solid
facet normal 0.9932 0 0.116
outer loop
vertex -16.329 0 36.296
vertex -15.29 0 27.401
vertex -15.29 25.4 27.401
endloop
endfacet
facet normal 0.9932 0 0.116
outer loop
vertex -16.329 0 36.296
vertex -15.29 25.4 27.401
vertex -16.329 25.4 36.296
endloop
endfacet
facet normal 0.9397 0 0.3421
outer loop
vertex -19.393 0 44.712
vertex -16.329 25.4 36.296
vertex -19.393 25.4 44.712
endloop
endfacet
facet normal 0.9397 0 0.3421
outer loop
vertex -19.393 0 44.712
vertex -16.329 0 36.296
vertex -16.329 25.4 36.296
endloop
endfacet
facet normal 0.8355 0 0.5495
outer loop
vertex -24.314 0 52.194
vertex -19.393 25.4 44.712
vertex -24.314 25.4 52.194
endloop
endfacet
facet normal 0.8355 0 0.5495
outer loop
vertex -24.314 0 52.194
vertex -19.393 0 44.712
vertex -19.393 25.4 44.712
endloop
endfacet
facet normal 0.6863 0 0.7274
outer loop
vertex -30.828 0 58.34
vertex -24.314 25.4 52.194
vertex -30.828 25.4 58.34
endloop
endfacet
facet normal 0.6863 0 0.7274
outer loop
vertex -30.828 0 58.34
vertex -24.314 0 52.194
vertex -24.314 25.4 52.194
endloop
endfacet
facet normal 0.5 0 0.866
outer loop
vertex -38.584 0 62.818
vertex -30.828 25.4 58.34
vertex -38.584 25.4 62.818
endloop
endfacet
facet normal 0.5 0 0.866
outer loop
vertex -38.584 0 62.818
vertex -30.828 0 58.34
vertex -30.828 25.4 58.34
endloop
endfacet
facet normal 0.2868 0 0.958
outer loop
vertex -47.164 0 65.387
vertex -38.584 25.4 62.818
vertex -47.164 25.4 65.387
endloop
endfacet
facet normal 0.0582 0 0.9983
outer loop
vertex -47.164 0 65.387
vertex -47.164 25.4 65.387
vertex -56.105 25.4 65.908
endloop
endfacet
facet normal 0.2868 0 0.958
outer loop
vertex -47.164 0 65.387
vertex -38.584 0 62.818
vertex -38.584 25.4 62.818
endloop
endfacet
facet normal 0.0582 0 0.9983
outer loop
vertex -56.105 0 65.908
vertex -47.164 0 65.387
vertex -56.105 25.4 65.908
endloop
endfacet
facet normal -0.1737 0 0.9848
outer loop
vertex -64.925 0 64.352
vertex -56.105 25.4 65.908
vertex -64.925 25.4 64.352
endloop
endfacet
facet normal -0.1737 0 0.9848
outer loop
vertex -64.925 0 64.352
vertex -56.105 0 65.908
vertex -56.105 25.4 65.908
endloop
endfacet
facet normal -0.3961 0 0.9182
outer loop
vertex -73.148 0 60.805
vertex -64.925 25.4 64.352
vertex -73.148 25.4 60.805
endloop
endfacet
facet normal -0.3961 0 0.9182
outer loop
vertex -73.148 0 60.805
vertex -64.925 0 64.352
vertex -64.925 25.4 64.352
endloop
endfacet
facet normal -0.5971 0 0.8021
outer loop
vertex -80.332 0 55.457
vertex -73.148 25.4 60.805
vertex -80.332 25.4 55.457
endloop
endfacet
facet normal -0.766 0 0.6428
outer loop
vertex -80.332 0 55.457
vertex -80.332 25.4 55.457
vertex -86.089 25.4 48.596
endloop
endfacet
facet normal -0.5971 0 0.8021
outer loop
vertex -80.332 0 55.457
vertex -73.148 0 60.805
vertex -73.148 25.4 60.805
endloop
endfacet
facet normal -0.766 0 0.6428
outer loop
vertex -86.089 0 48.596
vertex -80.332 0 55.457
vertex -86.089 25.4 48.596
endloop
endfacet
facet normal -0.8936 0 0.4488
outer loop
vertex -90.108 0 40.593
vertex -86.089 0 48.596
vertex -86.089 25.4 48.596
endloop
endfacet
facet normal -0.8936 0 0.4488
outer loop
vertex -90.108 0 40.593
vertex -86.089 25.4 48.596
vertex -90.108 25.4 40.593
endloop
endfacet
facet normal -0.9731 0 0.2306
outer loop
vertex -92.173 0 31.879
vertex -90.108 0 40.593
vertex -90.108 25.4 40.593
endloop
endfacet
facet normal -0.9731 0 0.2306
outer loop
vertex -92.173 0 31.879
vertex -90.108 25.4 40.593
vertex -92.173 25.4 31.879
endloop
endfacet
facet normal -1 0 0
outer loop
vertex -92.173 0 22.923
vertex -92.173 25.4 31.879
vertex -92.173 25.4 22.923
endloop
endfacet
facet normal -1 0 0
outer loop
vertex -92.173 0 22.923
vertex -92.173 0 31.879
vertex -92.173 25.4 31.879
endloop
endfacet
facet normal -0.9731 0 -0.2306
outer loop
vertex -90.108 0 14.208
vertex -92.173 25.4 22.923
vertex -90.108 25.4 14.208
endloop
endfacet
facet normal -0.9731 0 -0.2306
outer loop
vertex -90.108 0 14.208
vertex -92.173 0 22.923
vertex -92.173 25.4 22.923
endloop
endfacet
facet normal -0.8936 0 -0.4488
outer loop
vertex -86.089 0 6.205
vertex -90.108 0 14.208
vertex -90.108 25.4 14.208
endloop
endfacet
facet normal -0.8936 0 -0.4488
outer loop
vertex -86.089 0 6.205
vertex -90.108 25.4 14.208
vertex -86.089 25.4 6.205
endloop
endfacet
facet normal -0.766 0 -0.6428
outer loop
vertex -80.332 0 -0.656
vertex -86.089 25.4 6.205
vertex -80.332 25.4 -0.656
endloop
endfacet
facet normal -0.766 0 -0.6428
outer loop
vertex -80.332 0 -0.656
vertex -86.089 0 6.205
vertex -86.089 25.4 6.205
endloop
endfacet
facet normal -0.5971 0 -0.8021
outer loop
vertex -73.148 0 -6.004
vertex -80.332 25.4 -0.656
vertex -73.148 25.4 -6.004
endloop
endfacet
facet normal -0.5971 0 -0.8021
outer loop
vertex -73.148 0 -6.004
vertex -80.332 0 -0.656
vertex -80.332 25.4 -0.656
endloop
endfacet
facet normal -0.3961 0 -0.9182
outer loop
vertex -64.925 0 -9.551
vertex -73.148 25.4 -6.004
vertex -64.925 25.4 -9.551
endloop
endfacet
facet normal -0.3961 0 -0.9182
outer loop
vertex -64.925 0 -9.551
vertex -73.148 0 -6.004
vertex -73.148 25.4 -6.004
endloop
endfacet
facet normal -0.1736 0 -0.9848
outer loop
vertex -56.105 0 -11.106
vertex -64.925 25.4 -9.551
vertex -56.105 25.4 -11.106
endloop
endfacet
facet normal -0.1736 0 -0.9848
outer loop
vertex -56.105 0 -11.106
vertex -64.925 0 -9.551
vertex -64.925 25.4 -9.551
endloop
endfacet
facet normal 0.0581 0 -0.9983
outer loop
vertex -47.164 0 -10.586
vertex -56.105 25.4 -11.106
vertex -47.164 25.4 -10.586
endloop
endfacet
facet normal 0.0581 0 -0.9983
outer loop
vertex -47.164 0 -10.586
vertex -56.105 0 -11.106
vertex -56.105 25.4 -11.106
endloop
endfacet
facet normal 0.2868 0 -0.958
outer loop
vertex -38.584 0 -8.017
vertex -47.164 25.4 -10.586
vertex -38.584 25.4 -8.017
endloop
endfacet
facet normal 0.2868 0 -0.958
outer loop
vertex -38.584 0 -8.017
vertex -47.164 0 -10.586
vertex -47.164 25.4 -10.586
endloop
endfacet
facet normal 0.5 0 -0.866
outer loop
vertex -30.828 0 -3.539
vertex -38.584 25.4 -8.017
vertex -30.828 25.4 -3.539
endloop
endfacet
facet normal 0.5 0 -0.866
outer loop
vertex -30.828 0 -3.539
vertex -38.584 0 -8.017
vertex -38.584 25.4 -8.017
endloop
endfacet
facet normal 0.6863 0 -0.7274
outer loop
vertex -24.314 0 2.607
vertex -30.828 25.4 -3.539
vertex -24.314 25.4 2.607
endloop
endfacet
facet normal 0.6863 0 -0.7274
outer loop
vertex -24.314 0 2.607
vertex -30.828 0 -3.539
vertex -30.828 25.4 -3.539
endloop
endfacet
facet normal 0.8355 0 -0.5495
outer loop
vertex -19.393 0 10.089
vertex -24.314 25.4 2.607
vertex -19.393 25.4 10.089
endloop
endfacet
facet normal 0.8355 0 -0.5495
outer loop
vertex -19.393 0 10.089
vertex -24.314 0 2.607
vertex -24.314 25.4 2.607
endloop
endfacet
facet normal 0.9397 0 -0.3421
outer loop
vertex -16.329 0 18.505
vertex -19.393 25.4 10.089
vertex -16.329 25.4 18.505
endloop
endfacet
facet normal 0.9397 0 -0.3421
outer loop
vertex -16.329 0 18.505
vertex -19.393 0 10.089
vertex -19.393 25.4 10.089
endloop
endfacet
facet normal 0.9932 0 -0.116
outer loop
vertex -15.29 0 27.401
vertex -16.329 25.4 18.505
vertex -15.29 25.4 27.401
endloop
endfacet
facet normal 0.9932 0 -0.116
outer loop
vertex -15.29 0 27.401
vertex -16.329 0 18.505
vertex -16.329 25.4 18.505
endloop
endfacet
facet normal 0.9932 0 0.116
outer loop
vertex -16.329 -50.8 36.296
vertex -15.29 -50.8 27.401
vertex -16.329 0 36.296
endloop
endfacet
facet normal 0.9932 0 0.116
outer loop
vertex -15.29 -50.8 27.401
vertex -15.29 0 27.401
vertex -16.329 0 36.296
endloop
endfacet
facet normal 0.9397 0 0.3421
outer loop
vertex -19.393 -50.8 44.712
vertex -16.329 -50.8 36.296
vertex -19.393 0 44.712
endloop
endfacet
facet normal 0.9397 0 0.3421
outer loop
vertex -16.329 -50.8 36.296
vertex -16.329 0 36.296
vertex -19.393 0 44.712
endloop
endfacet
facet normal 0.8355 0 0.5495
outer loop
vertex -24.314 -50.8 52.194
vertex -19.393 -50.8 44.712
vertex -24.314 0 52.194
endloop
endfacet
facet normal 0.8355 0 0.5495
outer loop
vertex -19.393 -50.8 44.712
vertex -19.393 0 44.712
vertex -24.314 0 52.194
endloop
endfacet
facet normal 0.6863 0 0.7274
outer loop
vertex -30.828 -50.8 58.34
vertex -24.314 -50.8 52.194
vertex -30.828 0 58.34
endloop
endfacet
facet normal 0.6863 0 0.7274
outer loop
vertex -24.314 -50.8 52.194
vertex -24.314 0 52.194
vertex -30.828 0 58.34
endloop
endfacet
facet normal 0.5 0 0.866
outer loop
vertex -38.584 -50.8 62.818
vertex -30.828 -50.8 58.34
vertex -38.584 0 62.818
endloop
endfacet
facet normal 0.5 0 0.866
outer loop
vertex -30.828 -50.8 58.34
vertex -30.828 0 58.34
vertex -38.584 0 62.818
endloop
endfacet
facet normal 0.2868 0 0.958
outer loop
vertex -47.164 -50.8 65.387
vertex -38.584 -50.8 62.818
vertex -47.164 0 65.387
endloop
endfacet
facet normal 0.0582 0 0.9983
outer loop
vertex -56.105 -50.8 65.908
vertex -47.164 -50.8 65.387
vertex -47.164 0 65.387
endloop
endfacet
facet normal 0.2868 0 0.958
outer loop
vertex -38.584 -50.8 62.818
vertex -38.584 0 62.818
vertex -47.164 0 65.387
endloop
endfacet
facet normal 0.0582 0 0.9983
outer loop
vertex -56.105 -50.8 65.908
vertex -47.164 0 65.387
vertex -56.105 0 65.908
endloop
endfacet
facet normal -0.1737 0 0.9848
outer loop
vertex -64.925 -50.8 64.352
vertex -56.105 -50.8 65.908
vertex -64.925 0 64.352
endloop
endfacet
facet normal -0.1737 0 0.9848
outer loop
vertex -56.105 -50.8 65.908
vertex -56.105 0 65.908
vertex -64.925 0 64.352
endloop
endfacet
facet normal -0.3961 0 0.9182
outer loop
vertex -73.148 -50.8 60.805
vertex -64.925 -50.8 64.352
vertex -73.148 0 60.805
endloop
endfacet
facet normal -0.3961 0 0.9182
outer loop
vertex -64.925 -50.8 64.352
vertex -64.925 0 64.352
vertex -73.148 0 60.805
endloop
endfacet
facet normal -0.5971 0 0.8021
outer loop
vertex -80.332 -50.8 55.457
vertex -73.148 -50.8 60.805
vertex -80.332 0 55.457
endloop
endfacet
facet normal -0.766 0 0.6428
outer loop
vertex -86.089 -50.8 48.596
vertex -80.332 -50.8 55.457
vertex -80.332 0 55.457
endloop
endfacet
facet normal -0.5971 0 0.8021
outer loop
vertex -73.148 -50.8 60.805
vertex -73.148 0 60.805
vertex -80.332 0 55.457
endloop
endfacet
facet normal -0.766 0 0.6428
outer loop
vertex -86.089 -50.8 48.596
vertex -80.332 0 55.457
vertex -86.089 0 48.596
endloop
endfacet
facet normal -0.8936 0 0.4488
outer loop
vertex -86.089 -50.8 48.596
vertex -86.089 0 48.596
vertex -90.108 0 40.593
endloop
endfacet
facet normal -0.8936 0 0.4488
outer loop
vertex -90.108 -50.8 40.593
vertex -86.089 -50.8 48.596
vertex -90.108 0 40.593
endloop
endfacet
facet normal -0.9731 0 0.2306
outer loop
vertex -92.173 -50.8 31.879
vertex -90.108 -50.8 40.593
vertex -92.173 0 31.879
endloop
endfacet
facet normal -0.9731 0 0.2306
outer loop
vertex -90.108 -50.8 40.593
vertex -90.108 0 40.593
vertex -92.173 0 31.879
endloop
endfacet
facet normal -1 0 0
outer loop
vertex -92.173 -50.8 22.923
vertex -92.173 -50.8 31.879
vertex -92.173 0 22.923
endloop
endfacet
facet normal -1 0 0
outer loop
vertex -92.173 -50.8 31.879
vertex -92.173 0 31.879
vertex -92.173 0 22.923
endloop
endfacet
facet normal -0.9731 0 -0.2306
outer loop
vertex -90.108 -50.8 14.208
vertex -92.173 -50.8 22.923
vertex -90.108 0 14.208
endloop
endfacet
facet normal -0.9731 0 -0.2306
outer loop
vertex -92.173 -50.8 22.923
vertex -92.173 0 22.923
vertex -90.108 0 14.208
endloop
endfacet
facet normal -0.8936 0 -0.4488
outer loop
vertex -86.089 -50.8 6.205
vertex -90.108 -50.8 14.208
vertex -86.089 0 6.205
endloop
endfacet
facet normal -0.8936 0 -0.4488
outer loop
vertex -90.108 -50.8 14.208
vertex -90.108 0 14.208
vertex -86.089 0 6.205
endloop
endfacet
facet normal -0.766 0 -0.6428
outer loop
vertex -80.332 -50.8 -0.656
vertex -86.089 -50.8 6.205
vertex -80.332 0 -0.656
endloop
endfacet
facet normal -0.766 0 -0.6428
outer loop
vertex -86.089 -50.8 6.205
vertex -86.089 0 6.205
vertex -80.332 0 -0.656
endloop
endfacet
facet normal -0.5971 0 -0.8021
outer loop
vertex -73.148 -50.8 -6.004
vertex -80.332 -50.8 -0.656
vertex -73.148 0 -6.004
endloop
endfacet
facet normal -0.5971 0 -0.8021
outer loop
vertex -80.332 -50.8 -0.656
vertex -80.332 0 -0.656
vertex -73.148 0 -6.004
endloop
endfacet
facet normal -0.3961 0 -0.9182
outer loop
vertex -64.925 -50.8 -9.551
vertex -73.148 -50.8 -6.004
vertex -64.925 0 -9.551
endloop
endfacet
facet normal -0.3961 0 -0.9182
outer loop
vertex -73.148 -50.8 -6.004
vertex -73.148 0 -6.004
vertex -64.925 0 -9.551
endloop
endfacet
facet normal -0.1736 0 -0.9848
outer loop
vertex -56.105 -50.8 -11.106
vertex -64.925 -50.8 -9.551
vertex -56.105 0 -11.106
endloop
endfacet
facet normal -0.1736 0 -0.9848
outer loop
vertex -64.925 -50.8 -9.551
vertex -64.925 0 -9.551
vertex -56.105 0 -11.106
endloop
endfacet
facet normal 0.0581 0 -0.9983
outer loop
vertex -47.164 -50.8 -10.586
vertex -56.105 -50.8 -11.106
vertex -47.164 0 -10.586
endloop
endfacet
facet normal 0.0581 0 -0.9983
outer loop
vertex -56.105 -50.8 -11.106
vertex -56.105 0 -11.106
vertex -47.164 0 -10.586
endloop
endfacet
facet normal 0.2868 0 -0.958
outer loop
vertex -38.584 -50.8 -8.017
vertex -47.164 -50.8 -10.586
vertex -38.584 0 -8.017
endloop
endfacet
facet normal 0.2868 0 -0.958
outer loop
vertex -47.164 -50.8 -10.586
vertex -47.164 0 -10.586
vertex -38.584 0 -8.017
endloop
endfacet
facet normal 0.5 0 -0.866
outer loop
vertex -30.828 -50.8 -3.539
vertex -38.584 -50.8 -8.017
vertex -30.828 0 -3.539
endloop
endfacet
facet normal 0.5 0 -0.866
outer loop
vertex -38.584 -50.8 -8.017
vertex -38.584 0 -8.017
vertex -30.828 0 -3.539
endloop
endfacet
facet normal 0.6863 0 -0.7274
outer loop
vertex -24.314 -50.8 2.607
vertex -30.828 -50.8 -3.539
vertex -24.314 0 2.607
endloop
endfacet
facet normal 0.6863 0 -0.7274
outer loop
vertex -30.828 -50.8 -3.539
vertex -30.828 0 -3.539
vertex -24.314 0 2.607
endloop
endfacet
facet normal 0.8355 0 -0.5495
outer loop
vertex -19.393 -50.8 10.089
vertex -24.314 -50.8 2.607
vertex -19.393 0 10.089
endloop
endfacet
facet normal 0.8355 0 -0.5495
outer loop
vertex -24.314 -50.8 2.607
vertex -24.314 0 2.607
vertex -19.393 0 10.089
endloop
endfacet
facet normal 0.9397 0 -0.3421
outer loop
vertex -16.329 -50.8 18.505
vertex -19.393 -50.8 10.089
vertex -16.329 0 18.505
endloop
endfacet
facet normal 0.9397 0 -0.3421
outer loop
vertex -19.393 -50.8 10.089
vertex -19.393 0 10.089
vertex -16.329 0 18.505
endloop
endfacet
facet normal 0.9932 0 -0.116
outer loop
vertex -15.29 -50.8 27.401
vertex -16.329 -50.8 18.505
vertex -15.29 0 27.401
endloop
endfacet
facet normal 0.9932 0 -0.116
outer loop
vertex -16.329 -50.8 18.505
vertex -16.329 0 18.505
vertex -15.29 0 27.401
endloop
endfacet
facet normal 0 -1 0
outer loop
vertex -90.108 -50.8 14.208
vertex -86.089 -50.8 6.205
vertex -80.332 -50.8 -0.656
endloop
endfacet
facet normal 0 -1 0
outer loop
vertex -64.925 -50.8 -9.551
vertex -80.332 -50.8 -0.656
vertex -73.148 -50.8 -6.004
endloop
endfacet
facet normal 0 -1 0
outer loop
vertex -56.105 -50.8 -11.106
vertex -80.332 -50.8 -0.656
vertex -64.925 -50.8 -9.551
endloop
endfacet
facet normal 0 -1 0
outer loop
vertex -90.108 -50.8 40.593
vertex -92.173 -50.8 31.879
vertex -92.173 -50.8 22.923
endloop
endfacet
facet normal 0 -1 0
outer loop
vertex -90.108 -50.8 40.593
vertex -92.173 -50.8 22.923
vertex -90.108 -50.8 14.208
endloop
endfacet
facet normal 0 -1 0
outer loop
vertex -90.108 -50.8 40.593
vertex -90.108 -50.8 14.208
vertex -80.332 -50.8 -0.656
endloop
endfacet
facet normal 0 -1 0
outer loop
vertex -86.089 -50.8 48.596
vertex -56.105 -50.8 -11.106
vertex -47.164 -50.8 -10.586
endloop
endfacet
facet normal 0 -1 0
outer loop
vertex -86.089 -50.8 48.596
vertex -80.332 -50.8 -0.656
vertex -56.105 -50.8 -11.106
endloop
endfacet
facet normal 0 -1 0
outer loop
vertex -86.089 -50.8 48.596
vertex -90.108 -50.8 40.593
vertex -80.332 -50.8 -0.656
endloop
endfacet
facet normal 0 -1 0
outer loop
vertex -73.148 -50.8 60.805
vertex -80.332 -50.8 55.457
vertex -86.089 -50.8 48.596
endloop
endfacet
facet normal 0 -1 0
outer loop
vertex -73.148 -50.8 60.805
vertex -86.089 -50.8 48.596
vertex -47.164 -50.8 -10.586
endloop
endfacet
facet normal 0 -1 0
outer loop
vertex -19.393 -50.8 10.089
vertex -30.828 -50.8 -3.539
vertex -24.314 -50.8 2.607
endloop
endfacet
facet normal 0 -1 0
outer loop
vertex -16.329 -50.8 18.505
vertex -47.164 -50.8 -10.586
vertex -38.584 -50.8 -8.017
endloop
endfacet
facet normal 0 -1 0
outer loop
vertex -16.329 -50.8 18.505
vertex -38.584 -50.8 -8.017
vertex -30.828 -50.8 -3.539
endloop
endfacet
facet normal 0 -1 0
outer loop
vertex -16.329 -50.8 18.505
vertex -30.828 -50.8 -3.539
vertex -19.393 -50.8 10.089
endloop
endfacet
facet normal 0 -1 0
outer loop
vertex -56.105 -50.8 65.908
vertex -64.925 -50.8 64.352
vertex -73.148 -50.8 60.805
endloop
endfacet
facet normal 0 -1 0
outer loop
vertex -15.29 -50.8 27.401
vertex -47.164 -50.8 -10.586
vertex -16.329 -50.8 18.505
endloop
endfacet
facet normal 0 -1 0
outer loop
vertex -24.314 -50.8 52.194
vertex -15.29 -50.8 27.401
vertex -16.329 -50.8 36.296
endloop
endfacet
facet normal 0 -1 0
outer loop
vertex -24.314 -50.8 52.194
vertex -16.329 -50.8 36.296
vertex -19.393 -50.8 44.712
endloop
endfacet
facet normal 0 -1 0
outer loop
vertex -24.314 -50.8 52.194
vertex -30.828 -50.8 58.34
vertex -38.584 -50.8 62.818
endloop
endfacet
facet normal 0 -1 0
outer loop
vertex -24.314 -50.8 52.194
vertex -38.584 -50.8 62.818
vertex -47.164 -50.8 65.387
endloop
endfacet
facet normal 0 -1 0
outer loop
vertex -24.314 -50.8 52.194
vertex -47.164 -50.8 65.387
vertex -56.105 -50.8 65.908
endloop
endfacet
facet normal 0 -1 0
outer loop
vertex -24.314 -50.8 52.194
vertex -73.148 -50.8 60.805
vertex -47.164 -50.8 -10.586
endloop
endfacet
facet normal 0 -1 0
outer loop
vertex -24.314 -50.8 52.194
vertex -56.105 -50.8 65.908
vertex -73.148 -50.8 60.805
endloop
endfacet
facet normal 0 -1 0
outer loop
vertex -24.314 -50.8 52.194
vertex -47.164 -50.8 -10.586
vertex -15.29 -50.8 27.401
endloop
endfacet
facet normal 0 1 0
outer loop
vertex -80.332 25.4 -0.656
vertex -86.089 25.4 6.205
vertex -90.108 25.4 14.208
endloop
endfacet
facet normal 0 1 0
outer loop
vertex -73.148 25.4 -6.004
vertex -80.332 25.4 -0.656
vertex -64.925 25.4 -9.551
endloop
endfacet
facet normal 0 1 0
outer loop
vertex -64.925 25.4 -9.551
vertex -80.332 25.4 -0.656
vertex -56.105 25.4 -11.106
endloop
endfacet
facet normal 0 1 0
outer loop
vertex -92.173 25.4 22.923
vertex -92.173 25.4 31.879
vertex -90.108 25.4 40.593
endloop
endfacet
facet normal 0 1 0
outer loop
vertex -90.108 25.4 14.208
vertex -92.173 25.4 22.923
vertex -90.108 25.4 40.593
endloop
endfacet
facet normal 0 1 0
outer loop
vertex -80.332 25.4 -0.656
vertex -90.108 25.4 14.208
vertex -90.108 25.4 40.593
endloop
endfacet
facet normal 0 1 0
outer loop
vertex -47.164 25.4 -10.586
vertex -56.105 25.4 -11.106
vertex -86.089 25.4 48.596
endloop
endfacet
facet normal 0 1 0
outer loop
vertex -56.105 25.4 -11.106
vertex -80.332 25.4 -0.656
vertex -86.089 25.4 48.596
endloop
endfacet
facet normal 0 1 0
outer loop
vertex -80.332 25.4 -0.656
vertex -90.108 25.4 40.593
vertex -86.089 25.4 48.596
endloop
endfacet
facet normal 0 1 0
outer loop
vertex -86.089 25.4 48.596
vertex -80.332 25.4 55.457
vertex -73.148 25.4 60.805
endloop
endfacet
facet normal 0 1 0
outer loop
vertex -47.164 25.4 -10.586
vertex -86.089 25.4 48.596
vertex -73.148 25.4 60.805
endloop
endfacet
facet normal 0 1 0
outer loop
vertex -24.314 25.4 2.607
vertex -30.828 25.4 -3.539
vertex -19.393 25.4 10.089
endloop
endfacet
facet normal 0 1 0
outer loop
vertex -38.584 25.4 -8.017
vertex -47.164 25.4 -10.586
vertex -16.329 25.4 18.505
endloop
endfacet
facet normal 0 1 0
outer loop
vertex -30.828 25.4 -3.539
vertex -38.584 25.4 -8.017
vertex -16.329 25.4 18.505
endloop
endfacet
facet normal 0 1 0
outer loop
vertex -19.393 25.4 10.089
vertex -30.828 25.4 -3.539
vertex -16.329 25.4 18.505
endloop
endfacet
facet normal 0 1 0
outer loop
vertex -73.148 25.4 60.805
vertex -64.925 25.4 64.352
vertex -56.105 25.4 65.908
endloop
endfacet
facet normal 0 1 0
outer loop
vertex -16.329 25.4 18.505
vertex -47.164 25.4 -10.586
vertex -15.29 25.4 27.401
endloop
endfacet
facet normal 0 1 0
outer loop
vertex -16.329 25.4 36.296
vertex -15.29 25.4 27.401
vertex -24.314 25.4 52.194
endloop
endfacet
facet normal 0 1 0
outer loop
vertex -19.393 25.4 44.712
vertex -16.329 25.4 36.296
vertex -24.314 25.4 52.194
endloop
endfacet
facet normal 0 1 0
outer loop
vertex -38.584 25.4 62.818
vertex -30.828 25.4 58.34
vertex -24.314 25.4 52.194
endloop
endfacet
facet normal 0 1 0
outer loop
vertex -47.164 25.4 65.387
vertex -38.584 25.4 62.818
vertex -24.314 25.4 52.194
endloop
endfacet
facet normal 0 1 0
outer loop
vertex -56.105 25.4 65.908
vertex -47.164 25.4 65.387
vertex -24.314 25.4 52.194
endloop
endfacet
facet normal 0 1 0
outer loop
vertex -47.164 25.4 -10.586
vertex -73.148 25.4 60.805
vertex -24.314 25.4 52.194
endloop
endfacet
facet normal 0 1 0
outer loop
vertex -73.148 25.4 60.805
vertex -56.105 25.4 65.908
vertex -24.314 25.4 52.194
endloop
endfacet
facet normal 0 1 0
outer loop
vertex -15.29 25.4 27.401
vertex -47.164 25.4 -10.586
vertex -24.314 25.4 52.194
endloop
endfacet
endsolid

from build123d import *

# Parameters (mm, degrees)
F0_R     = 38.572234299
F1_DEPTH = 25.4
F2_DEPTH = 25.4
F3_DEPTH = 25.4


with BuildPart() as f1:
    # F0 (on Front) → F1 (new body)
    with BuildSketch(Plane.XZ):
        with Locations((-53.8619197905, 27.4006854743)):
            Circle(F0_R)
    extrude(amount=F1_DEPTH)

    # F2 (add): faces of the model
    f2_faces = [f1.faces().sort_by_distance(p)[0] for p in [
        (-53.8619197905, -25.4, 27.4006854743),
        (-53.8619197905, 0, 27.4006854743),
    ]]
    extrude(f2_faces, amount=F2_DEPTH, dir=(0, -1, 0))

    # F3 (add): a face of the model
    f3_faces = [f1.faces().sort_by_distance(p)[0] for p in [
        (-53.8619197905, 0, 27.4006854743),
    ]]
    extrude(f3_faces, amount=F3_DEPTH)


solid = f1.part
